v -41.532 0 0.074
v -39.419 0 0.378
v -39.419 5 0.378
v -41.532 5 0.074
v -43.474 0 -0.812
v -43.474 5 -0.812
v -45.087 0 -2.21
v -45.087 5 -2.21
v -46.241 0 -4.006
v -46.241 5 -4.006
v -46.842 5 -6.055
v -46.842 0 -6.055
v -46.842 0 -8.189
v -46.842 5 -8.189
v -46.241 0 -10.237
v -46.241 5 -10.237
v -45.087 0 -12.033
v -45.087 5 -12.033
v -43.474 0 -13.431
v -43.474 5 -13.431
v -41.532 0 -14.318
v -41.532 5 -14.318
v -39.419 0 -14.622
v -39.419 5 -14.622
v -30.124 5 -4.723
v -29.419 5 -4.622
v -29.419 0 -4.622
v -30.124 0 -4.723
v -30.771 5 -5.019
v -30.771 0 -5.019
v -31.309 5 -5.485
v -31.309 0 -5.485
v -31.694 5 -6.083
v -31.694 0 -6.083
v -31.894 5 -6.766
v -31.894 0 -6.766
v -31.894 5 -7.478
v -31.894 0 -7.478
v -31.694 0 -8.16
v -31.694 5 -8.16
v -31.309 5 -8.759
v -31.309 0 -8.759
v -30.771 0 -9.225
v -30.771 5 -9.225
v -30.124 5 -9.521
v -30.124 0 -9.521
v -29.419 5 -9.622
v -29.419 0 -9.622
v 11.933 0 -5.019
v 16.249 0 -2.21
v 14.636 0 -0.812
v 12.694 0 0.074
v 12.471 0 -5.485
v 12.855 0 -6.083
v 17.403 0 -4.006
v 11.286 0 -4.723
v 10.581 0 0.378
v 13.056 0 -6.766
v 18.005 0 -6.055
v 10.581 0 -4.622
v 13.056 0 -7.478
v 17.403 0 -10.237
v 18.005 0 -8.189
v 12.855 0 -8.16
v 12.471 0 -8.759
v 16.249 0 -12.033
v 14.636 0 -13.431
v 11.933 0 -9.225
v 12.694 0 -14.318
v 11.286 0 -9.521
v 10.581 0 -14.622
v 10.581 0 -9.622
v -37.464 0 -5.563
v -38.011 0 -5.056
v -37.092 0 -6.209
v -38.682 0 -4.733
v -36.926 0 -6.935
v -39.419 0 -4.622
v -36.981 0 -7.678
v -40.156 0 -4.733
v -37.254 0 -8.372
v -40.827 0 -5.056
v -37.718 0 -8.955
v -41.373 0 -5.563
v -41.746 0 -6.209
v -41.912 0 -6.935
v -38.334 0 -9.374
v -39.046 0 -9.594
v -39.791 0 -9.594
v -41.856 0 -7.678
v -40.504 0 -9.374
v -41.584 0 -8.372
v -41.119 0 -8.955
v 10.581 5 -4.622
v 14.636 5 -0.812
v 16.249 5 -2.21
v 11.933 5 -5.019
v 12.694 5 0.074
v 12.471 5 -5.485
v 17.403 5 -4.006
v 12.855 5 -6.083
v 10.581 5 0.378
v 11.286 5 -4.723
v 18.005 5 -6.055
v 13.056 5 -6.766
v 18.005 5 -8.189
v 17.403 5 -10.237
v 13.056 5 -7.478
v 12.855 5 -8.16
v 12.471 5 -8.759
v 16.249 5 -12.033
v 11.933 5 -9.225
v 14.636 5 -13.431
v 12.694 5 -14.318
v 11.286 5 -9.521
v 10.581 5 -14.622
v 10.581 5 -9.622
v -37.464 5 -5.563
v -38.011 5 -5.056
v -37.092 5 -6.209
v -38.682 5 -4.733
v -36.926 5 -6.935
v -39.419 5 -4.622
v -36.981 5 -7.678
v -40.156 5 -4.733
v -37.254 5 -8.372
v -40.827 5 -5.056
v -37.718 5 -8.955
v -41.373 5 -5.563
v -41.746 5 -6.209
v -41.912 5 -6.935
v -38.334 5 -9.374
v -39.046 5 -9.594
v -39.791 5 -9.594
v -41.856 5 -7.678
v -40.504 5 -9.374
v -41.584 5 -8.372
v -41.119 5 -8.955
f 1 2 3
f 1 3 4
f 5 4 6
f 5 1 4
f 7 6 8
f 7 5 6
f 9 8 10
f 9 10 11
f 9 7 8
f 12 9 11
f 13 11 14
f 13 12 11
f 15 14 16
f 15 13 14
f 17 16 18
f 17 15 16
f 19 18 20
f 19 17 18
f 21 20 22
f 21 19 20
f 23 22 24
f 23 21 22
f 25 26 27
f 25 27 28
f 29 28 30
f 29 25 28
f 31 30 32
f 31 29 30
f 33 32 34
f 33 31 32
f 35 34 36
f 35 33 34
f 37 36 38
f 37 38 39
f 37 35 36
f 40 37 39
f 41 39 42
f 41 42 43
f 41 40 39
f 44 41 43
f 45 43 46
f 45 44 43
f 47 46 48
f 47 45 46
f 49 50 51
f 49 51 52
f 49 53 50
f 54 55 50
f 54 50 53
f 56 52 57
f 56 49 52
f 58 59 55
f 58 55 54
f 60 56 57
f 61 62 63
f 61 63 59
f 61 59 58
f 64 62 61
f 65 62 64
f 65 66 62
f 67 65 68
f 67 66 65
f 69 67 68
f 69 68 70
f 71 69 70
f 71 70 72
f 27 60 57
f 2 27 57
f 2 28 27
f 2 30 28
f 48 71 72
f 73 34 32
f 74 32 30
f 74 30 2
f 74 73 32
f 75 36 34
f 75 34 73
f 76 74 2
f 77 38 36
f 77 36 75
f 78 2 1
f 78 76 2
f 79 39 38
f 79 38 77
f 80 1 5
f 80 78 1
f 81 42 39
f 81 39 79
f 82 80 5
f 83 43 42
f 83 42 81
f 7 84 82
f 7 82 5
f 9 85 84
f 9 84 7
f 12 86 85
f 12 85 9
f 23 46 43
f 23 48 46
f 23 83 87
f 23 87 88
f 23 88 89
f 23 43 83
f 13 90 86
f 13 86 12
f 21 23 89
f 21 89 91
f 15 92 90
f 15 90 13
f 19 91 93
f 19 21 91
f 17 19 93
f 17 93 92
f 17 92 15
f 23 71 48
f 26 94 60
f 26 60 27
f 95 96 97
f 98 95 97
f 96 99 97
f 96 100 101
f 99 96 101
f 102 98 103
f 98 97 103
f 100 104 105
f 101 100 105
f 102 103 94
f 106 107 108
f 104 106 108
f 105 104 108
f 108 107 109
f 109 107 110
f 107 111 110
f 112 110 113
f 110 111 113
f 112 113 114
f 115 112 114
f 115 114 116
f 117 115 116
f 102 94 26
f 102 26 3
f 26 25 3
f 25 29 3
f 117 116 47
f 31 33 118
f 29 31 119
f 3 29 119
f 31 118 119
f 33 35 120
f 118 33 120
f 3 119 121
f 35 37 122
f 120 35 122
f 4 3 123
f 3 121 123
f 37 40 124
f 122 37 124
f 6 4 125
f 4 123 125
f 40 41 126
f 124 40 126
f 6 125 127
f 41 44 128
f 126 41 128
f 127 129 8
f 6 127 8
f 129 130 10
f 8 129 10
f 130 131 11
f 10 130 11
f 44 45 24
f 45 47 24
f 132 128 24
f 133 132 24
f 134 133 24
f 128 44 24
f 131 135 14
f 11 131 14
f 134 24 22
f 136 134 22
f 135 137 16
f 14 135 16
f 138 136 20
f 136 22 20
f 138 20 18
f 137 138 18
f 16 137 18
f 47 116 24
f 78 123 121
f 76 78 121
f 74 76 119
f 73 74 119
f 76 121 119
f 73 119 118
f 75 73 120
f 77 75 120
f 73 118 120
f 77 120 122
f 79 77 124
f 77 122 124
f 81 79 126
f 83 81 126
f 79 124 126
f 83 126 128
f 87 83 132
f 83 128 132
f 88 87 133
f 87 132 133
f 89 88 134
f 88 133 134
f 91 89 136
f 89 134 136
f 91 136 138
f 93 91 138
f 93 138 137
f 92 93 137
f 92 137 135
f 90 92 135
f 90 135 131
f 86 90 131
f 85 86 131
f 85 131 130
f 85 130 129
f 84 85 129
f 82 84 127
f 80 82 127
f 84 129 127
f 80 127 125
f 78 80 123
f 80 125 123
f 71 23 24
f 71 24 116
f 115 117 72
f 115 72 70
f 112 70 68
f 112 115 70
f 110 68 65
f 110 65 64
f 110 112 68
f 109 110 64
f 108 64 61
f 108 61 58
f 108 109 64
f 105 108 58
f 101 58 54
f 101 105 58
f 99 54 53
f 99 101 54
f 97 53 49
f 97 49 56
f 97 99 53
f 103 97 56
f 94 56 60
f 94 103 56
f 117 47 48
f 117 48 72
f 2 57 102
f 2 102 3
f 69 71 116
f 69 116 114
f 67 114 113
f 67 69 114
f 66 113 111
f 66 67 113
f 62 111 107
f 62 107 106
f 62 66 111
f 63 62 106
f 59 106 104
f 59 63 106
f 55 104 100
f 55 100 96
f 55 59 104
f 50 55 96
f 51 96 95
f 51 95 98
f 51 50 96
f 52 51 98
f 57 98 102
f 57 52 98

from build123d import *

# Parameters (mm, degrees)
BOSS_EXTRUDE1_DEPTH = 5
SKETCH3_R           = 2.5
CUT_EXTRUDE1_DEPTH  = 5


with BuildPart() as part:
    # Sketch1 → Boss-Extrude1 (new body)
    with BuildSketch(Plane(origin=(0, 0, 0), x_dir=(1, 0, 0), z_dir=(0, 1, 0))):
        with BuildLine():
            Line((-39.418817776, 14.621878605), (10.581182224, 14.621878605))
            ThreePointArc((10.581182224, 14.621878605), (18.081182224, 7.121878605), (10.581182224, -0.378121395))
            Line((10.581182224, -0.378121395), (-39.418817776, -0.378121395))
            ThreePointArc((-39.418817776, -0.378121395), (-46.918817776, 7.121878605), (-39.418817776, 14.621878605))
        make_face()
    extrude(amount=BOSS_EXTRUDE1_DEPTH)

    # Sketch3 → Cut-Extrude1 (cut)
    with BuildSketch(Plane(origin=(0, 5, 0), x_dir=(1, 0, 0), z_dir=(0, 1, 0))):
        with Locations(Location((-39.418817776, 7.121878605, 0), (0, 0, 270))):
            Circle(SKETCH3_R)
        with BuildLine():
            Line((-29.419490327, 9.621878605), (10.581182224, 9.621878605))
            ThreePointArc((10.581182224, 9.621878605), (13.081182224, 7.121878605), (10.581182224, 4.621878605))
            Line((10.581182224, 4.621878605), (-29.419490327, 4.621878605))
            ThreePointArc((-29.419490327, 4.621878605), (-31.919490327, 7.121878605), (-29.419490327, 9.621878605))
        make_face()
    extrude(amount=-CUT_EXTRUDE1_DEPTH, mode=Mode.SUBTRACT)


solid = part.part
